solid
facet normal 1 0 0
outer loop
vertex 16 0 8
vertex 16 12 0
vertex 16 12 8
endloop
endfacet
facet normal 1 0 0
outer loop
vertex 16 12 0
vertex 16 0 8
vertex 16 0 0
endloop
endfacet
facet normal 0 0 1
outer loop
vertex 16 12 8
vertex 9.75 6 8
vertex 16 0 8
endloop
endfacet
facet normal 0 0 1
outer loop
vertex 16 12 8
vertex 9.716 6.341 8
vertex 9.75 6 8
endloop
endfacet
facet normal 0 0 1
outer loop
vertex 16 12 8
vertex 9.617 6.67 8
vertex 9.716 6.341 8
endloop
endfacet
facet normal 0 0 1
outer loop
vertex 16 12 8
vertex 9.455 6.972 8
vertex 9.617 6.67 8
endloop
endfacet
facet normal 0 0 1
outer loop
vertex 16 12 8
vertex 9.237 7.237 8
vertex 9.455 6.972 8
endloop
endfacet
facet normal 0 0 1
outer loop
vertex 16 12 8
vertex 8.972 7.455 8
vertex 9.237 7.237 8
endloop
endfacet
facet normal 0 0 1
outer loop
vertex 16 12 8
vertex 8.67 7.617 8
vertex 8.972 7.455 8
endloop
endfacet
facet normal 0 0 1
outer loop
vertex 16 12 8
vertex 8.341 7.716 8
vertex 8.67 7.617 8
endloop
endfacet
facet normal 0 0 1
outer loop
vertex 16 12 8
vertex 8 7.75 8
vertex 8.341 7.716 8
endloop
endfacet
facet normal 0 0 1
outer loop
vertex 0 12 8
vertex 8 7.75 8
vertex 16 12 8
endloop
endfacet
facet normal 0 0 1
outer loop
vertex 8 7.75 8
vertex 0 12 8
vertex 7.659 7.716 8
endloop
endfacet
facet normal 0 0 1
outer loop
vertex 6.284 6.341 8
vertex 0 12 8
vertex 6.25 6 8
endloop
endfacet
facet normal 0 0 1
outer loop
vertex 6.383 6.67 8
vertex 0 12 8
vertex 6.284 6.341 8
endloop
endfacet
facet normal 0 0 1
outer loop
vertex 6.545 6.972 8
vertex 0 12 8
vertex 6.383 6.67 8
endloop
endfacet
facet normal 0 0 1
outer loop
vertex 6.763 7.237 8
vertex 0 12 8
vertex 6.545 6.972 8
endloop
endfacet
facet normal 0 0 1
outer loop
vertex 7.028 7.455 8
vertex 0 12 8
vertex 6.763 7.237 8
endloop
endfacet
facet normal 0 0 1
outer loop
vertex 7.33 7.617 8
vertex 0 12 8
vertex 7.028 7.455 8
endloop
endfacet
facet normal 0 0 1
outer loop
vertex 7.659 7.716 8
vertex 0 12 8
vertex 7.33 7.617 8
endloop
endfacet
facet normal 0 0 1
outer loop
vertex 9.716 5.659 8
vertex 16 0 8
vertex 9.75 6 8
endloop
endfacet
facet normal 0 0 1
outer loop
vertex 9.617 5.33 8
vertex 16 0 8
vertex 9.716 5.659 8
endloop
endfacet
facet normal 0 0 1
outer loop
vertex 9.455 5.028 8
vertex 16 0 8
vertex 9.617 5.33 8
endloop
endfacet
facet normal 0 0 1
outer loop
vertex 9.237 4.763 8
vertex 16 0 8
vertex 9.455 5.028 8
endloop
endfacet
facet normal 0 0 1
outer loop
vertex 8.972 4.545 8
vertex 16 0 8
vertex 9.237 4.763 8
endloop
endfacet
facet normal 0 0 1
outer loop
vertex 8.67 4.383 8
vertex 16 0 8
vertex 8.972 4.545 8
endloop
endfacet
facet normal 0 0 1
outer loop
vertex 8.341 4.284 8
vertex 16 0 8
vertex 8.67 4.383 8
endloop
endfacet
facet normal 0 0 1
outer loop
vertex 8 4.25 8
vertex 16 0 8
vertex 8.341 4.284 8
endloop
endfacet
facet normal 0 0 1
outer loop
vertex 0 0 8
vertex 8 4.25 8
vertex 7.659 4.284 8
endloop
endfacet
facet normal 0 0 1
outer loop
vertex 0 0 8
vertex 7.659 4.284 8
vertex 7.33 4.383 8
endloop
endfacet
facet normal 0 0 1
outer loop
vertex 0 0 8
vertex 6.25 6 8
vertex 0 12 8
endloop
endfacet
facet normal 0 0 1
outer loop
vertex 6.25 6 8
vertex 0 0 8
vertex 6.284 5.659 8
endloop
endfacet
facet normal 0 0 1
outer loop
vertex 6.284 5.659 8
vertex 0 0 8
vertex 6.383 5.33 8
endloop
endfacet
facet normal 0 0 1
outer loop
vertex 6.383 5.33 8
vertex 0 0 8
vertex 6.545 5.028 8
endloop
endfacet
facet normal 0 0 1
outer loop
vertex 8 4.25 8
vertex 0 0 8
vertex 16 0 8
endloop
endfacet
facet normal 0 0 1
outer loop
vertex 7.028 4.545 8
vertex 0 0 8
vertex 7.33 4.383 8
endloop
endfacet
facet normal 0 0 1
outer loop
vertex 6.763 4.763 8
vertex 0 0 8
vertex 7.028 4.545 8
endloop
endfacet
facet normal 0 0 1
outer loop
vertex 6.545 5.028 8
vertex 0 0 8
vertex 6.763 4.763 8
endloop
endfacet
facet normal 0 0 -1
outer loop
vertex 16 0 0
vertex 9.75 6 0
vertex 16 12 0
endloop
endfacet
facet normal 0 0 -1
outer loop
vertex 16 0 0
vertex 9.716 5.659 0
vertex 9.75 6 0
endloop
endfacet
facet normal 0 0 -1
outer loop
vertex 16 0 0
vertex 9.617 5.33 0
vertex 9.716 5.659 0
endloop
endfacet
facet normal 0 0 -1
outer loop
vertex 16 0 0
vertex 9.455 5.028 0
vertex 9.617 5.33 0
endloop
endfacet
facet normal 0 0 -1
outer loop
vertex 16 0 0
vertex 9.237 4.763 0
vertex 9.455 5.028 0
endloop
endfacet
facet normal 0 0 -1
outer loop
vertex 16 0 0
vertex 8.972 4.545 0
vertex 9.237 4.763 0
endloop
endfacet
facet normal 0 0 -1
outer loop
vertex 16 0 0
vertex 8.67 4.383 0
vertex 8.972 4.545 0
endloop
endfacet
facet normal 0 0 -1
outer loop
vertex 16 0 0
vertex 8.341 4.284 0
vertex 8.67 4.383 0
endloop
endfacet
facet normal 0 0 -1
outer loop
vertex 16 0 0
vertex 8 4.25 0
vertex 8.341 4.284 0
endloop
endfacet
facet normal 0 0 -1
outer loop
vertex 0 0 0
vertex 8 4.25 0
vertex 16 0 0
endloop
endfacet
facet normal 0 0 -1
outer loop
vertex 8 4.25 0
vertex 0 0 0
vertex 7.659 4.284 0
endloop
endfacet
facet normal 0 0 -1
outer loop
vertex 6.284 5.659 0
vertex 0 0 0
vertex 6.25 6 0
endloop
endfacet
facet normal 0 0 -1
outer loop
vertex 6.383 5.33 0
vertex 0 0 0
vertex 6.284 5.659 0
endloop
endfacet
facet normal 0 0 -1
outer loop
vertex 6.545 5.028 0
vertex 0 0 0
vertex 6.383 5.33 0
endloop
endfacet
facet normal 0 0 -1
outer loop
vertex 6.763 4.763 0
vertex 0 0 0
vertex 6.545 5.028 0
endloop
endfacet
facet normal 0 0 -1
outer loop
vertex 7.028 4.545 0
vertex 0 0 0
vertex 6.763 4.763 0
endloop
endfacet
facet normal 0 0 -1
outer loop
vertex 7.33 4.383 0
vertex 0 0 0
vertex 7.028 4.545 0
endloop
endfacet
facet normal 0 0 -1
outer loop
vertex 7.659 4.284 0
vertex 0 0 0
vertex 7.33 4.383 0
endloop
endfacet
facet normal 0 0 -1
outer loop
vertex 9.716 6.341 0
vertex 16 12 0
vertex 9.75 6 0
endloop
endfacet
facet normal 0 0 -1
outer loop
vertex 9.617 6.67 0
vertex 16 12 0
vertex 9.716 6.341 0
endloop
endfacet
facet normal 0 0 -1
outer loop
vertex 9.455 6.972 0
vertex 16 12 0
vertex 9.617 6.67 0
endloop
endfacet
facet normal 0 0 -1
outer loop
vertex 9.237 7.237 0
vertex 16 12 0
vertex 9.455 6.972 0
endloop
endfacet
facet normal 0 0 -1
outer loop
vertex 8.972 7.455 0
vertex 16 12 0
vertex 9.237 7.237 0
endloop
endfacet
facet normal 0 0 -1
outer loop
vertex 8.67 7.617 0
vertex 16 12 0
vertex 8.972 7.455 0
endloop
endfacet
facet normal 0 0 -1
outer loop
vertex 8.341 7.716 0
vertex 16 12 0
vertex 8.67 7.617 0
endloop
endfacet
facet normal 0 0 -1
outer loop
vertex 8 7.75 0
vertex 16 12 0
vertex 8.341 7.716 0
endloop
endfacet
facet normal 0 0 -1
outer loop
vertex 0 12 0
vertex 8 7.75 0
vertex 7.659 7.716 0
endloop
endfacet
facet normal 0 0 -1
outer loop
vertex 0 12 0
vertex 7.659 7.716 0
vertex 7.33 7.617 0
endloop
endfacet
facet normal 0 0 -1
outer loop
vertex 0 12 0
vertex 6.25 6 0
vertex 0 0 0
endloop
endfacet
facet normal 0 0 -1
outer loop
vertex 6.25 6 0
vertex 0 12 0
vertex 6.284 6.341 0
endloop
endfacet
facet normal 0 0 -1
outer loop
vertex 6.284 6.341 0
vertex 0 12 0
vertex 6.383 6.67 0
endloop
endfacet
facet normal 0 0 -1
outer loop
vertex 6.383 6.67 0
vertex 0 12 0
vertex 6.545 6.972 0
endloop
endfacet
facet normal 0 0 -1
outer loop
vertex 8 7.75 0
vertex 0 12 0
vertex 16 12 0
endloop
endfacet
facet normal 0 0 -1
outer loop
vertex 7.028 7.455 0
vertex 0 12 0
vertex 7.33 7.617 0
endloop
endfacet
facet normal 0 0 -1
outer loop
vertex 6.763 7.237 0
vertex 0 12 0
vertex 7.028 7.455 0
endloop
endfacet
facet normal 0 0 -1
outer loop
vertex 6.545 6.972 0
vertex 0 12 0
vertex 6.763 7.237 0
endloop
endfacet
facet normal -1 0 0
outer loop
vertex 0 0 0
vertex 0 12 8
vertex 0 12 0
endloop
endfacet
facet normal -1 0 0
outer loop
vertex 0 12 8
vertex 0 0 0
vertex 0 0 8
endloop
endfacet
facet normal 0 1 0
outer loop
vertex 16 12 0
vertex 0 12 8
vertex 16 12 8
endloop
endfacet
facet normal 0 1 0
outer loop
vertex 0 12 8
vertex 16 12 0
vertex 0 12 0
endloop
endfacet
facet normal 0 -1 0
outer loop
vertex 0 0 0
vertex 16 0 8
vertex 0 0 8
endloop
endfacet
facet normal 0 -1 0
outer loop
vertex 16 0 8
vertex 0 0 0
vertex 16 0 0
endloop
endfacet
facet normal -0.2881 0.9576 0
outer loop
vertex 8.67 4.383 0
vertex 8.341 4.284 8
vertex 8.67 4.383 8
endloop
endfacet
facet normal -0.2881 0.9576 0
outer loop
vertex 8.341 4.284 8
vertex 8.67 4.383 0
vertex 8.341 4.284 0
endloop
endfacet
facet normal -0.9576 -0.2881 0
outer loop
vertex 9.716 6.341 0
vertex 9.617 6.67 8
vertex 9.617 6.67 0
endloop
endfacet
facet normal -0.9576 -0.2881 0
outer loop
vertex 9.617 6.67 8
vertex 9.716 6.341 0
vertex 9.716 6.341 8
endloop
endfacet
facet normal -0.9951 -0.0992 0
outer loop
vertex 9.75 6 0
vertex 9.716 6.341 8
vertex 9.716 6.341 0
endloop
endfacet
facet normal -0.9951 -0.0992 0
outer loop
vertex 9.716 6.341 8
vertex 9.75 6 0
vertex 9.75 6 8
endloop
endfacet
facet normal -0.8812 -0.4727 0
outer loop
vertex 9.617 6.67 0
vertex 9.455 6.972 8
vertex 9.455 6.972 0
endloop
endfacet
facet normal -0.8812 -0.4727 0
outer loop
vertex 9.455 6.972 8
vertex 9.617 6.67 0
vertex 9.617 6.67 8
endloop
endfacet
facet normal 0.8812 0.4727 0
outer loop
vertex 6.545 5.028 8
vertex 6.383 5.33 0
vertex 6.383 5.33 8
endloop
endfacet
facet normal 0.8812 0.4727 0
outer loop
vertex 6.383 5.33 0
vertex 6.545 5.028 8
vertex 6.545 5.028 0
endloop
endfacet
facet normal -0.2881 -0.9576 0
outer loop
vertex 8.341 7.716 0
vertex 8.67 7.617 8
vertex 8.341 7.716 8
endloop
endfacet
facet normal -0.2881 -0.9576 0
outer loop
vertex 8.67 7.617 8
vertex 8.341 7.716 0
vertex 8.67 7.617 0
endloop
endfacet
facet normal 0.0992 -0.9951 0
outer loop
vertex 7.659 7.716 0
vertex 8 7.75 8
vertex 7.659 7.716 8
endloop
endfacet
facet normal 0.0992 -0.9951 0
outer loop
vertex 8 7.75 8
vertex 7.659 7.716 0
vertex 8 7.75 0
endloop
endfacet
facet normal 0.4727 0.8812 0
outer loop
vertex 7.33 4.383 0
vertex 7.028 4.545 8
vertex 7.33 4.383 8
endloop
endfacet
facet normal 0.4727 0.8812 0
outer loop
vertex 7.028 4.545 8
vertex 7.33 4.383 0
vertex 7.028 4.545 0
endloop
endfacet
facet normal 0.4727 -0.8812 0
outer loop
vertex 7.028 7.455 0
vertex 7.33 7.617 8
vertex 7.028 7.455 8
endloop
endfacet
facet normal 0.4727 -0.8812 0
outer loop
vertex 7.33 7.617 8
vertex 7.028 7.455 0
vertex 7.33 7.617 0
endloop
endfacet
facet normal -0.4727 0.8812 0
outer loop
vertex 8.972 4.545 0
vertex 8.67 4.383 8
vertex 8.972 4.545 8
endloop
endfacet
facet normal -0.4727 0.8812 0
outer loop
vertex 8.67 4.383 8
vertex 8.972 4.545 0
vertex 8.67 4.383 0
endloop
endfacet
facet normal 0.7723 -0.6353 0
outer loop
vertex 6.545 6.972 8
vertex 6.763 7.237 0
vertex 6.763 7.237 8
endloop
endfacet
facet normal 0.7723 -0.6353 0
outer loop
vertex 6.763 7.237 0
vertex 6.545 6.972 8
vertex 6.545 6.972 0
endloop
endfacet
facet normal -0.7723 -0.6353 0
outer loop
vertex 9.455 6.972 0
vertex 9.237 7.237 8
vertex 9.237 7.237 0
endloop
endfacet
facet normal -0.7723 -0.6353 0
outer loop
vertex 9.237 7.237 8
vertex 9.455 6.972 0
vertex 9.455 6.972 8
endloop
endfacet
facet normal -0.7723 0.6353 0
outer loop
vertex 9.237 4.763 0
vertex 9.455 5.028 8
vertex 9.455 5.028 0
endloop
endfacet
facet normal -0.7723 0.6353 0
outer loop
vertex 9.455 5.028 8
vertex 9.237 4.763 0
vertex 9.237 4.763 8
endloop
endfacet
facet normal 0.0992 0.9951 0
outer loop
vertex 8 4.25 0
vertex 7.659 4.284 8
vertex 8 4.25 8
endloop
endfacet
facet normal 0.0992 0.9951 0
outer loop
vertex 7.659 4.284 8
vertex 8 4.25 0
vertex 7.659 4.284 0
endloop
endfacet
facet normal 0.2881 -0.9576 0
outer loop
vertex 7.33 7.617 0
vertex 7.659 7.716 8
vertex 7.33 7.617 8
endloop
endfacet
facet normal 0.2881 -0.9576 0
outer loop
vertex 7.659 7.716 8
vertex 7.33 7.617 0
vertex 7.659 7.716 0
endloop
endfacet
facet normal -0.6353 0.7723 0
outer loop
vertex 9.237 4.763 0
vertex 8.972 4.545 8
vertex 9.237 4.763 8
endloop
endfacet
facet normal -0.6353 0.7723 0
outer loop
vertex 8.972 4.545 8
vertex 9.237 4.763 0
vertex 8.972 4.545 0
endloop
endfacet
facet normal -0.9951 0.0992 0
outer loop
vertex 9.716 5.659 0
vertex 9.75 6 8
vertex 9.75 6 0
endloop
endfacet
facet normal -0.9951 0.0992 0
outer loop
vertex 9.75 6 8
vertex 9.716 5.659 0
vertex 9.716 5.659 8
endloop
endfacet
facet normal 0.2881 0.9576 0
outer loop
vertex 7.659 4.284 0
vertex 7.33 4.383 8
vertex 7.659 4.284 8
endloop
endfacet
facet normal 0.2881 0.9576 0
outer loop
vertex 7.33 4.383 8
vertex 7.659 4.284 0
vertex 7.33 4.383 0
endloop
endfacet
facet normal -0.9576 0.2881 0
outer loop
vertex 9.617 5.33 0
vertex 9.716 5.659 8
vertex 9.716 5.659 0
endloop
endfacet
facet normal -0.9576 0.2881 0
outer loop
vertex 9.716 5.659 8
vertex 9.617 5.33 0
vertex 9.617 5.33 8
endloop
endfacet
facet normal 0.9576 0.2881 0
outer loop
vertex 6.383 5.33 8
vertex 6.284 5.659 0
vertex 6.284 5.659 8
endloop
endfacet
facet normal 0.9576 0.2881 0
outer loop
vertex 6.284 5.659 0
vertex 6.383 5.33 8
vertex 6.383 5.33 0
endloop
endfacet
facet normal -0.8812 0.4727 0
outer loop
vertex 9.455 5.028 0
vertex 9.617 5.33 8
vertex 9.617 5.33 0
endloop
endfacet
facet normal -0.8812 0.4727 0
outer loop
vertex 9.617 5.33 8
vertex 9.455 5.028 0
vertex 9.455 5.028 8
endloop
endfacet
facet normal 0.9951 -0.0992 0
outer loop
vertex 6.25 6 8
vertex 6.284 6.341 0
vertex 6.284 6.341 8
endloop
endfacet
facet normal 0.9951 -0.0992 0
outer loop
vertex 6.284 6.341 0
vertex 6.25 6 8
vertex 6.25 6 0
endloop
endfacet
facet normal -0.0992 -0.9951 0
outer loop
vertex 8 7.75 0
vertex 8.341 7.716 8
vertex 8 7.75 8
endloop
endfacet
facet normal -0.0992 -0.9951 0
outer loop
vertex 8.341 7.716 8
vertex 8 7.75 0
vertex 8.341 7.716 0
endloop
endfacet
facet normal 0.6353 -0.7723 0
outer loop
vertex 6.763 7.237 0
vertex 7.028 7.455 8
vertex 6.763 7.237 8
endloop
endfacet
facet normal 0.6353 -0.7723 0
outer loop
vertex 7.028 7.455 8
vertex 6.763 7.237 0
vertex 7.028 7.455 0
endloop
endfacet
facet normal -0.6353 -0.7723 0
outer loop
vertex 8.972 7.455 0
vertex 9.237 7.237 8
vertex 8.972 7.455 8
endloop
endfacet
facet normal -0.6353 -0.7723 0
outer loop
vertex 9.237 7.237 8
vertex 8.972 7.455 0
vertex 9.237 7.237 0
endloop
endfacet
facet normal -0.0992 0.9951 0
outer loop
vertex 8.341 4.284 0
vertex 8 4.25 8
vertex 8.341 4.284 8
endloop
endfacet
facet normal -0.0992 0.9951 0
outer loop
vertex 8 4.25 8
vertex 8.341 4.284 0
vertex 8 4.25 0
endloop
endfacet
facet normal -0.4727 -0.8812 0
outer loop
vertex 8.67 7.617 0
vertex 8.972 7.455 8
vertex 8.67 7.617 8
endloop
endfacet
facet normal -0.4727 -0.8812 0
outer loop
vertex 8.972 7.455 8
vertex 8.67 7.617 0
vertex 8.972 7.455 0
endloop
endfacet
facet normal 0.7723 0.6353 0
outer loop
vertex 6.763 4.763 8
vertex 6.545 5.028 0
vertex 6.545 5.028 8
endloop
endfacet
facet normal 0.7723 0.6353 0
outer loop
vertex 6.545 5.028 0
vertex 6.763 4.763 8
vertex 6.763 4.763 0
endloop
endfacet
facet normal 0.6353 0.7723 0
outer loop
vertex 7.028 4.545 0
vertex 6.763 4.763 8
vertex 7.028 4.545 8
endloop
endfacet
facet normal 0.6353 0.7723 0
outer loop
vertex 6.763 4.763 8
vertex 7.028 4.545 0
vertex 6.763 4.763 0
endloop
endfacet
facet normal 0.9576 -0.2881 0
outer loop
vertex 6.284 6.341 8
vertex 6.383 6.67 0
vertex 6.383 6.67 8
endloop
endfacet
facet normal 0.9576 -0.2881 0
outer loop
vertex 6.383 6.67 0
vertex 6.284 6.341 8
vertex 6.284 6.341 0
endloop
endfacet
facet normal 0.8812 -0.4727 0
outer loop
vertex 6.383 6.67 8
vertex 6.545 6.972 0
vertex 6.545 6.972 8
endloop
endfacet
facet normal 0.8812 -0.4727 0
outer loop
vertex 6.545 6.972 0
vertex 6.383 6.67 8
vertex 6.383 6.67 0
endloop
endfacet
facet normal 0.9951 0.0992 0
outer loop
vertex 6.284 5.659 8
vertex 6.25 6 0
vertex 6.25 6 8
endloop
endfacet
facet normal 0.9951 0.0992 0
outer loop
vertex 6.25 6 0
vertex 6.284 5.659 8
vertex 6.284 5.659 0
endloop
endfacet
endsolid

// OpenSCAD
$fn = 32;

// ----------------------------------------------------------------------
// Micro pad: drilled pad, 5-20 mm class
// ----------------------------------------------------------------------

// --- parameters (mm) ---
pad_l = 16;               // pad length, X
pad_w = 12;               // pad width, Y
pad_t = 8;                // pad thickness, Z
hole_d = 3.5;             // through hole diameter

difference() {
  cube([pad_l, pad_w, pad_t]);
  translate([pad_l / 2, pad_w / 2, -1])
    cylinder(h = pad_t + 2, d = hole_d);
}
